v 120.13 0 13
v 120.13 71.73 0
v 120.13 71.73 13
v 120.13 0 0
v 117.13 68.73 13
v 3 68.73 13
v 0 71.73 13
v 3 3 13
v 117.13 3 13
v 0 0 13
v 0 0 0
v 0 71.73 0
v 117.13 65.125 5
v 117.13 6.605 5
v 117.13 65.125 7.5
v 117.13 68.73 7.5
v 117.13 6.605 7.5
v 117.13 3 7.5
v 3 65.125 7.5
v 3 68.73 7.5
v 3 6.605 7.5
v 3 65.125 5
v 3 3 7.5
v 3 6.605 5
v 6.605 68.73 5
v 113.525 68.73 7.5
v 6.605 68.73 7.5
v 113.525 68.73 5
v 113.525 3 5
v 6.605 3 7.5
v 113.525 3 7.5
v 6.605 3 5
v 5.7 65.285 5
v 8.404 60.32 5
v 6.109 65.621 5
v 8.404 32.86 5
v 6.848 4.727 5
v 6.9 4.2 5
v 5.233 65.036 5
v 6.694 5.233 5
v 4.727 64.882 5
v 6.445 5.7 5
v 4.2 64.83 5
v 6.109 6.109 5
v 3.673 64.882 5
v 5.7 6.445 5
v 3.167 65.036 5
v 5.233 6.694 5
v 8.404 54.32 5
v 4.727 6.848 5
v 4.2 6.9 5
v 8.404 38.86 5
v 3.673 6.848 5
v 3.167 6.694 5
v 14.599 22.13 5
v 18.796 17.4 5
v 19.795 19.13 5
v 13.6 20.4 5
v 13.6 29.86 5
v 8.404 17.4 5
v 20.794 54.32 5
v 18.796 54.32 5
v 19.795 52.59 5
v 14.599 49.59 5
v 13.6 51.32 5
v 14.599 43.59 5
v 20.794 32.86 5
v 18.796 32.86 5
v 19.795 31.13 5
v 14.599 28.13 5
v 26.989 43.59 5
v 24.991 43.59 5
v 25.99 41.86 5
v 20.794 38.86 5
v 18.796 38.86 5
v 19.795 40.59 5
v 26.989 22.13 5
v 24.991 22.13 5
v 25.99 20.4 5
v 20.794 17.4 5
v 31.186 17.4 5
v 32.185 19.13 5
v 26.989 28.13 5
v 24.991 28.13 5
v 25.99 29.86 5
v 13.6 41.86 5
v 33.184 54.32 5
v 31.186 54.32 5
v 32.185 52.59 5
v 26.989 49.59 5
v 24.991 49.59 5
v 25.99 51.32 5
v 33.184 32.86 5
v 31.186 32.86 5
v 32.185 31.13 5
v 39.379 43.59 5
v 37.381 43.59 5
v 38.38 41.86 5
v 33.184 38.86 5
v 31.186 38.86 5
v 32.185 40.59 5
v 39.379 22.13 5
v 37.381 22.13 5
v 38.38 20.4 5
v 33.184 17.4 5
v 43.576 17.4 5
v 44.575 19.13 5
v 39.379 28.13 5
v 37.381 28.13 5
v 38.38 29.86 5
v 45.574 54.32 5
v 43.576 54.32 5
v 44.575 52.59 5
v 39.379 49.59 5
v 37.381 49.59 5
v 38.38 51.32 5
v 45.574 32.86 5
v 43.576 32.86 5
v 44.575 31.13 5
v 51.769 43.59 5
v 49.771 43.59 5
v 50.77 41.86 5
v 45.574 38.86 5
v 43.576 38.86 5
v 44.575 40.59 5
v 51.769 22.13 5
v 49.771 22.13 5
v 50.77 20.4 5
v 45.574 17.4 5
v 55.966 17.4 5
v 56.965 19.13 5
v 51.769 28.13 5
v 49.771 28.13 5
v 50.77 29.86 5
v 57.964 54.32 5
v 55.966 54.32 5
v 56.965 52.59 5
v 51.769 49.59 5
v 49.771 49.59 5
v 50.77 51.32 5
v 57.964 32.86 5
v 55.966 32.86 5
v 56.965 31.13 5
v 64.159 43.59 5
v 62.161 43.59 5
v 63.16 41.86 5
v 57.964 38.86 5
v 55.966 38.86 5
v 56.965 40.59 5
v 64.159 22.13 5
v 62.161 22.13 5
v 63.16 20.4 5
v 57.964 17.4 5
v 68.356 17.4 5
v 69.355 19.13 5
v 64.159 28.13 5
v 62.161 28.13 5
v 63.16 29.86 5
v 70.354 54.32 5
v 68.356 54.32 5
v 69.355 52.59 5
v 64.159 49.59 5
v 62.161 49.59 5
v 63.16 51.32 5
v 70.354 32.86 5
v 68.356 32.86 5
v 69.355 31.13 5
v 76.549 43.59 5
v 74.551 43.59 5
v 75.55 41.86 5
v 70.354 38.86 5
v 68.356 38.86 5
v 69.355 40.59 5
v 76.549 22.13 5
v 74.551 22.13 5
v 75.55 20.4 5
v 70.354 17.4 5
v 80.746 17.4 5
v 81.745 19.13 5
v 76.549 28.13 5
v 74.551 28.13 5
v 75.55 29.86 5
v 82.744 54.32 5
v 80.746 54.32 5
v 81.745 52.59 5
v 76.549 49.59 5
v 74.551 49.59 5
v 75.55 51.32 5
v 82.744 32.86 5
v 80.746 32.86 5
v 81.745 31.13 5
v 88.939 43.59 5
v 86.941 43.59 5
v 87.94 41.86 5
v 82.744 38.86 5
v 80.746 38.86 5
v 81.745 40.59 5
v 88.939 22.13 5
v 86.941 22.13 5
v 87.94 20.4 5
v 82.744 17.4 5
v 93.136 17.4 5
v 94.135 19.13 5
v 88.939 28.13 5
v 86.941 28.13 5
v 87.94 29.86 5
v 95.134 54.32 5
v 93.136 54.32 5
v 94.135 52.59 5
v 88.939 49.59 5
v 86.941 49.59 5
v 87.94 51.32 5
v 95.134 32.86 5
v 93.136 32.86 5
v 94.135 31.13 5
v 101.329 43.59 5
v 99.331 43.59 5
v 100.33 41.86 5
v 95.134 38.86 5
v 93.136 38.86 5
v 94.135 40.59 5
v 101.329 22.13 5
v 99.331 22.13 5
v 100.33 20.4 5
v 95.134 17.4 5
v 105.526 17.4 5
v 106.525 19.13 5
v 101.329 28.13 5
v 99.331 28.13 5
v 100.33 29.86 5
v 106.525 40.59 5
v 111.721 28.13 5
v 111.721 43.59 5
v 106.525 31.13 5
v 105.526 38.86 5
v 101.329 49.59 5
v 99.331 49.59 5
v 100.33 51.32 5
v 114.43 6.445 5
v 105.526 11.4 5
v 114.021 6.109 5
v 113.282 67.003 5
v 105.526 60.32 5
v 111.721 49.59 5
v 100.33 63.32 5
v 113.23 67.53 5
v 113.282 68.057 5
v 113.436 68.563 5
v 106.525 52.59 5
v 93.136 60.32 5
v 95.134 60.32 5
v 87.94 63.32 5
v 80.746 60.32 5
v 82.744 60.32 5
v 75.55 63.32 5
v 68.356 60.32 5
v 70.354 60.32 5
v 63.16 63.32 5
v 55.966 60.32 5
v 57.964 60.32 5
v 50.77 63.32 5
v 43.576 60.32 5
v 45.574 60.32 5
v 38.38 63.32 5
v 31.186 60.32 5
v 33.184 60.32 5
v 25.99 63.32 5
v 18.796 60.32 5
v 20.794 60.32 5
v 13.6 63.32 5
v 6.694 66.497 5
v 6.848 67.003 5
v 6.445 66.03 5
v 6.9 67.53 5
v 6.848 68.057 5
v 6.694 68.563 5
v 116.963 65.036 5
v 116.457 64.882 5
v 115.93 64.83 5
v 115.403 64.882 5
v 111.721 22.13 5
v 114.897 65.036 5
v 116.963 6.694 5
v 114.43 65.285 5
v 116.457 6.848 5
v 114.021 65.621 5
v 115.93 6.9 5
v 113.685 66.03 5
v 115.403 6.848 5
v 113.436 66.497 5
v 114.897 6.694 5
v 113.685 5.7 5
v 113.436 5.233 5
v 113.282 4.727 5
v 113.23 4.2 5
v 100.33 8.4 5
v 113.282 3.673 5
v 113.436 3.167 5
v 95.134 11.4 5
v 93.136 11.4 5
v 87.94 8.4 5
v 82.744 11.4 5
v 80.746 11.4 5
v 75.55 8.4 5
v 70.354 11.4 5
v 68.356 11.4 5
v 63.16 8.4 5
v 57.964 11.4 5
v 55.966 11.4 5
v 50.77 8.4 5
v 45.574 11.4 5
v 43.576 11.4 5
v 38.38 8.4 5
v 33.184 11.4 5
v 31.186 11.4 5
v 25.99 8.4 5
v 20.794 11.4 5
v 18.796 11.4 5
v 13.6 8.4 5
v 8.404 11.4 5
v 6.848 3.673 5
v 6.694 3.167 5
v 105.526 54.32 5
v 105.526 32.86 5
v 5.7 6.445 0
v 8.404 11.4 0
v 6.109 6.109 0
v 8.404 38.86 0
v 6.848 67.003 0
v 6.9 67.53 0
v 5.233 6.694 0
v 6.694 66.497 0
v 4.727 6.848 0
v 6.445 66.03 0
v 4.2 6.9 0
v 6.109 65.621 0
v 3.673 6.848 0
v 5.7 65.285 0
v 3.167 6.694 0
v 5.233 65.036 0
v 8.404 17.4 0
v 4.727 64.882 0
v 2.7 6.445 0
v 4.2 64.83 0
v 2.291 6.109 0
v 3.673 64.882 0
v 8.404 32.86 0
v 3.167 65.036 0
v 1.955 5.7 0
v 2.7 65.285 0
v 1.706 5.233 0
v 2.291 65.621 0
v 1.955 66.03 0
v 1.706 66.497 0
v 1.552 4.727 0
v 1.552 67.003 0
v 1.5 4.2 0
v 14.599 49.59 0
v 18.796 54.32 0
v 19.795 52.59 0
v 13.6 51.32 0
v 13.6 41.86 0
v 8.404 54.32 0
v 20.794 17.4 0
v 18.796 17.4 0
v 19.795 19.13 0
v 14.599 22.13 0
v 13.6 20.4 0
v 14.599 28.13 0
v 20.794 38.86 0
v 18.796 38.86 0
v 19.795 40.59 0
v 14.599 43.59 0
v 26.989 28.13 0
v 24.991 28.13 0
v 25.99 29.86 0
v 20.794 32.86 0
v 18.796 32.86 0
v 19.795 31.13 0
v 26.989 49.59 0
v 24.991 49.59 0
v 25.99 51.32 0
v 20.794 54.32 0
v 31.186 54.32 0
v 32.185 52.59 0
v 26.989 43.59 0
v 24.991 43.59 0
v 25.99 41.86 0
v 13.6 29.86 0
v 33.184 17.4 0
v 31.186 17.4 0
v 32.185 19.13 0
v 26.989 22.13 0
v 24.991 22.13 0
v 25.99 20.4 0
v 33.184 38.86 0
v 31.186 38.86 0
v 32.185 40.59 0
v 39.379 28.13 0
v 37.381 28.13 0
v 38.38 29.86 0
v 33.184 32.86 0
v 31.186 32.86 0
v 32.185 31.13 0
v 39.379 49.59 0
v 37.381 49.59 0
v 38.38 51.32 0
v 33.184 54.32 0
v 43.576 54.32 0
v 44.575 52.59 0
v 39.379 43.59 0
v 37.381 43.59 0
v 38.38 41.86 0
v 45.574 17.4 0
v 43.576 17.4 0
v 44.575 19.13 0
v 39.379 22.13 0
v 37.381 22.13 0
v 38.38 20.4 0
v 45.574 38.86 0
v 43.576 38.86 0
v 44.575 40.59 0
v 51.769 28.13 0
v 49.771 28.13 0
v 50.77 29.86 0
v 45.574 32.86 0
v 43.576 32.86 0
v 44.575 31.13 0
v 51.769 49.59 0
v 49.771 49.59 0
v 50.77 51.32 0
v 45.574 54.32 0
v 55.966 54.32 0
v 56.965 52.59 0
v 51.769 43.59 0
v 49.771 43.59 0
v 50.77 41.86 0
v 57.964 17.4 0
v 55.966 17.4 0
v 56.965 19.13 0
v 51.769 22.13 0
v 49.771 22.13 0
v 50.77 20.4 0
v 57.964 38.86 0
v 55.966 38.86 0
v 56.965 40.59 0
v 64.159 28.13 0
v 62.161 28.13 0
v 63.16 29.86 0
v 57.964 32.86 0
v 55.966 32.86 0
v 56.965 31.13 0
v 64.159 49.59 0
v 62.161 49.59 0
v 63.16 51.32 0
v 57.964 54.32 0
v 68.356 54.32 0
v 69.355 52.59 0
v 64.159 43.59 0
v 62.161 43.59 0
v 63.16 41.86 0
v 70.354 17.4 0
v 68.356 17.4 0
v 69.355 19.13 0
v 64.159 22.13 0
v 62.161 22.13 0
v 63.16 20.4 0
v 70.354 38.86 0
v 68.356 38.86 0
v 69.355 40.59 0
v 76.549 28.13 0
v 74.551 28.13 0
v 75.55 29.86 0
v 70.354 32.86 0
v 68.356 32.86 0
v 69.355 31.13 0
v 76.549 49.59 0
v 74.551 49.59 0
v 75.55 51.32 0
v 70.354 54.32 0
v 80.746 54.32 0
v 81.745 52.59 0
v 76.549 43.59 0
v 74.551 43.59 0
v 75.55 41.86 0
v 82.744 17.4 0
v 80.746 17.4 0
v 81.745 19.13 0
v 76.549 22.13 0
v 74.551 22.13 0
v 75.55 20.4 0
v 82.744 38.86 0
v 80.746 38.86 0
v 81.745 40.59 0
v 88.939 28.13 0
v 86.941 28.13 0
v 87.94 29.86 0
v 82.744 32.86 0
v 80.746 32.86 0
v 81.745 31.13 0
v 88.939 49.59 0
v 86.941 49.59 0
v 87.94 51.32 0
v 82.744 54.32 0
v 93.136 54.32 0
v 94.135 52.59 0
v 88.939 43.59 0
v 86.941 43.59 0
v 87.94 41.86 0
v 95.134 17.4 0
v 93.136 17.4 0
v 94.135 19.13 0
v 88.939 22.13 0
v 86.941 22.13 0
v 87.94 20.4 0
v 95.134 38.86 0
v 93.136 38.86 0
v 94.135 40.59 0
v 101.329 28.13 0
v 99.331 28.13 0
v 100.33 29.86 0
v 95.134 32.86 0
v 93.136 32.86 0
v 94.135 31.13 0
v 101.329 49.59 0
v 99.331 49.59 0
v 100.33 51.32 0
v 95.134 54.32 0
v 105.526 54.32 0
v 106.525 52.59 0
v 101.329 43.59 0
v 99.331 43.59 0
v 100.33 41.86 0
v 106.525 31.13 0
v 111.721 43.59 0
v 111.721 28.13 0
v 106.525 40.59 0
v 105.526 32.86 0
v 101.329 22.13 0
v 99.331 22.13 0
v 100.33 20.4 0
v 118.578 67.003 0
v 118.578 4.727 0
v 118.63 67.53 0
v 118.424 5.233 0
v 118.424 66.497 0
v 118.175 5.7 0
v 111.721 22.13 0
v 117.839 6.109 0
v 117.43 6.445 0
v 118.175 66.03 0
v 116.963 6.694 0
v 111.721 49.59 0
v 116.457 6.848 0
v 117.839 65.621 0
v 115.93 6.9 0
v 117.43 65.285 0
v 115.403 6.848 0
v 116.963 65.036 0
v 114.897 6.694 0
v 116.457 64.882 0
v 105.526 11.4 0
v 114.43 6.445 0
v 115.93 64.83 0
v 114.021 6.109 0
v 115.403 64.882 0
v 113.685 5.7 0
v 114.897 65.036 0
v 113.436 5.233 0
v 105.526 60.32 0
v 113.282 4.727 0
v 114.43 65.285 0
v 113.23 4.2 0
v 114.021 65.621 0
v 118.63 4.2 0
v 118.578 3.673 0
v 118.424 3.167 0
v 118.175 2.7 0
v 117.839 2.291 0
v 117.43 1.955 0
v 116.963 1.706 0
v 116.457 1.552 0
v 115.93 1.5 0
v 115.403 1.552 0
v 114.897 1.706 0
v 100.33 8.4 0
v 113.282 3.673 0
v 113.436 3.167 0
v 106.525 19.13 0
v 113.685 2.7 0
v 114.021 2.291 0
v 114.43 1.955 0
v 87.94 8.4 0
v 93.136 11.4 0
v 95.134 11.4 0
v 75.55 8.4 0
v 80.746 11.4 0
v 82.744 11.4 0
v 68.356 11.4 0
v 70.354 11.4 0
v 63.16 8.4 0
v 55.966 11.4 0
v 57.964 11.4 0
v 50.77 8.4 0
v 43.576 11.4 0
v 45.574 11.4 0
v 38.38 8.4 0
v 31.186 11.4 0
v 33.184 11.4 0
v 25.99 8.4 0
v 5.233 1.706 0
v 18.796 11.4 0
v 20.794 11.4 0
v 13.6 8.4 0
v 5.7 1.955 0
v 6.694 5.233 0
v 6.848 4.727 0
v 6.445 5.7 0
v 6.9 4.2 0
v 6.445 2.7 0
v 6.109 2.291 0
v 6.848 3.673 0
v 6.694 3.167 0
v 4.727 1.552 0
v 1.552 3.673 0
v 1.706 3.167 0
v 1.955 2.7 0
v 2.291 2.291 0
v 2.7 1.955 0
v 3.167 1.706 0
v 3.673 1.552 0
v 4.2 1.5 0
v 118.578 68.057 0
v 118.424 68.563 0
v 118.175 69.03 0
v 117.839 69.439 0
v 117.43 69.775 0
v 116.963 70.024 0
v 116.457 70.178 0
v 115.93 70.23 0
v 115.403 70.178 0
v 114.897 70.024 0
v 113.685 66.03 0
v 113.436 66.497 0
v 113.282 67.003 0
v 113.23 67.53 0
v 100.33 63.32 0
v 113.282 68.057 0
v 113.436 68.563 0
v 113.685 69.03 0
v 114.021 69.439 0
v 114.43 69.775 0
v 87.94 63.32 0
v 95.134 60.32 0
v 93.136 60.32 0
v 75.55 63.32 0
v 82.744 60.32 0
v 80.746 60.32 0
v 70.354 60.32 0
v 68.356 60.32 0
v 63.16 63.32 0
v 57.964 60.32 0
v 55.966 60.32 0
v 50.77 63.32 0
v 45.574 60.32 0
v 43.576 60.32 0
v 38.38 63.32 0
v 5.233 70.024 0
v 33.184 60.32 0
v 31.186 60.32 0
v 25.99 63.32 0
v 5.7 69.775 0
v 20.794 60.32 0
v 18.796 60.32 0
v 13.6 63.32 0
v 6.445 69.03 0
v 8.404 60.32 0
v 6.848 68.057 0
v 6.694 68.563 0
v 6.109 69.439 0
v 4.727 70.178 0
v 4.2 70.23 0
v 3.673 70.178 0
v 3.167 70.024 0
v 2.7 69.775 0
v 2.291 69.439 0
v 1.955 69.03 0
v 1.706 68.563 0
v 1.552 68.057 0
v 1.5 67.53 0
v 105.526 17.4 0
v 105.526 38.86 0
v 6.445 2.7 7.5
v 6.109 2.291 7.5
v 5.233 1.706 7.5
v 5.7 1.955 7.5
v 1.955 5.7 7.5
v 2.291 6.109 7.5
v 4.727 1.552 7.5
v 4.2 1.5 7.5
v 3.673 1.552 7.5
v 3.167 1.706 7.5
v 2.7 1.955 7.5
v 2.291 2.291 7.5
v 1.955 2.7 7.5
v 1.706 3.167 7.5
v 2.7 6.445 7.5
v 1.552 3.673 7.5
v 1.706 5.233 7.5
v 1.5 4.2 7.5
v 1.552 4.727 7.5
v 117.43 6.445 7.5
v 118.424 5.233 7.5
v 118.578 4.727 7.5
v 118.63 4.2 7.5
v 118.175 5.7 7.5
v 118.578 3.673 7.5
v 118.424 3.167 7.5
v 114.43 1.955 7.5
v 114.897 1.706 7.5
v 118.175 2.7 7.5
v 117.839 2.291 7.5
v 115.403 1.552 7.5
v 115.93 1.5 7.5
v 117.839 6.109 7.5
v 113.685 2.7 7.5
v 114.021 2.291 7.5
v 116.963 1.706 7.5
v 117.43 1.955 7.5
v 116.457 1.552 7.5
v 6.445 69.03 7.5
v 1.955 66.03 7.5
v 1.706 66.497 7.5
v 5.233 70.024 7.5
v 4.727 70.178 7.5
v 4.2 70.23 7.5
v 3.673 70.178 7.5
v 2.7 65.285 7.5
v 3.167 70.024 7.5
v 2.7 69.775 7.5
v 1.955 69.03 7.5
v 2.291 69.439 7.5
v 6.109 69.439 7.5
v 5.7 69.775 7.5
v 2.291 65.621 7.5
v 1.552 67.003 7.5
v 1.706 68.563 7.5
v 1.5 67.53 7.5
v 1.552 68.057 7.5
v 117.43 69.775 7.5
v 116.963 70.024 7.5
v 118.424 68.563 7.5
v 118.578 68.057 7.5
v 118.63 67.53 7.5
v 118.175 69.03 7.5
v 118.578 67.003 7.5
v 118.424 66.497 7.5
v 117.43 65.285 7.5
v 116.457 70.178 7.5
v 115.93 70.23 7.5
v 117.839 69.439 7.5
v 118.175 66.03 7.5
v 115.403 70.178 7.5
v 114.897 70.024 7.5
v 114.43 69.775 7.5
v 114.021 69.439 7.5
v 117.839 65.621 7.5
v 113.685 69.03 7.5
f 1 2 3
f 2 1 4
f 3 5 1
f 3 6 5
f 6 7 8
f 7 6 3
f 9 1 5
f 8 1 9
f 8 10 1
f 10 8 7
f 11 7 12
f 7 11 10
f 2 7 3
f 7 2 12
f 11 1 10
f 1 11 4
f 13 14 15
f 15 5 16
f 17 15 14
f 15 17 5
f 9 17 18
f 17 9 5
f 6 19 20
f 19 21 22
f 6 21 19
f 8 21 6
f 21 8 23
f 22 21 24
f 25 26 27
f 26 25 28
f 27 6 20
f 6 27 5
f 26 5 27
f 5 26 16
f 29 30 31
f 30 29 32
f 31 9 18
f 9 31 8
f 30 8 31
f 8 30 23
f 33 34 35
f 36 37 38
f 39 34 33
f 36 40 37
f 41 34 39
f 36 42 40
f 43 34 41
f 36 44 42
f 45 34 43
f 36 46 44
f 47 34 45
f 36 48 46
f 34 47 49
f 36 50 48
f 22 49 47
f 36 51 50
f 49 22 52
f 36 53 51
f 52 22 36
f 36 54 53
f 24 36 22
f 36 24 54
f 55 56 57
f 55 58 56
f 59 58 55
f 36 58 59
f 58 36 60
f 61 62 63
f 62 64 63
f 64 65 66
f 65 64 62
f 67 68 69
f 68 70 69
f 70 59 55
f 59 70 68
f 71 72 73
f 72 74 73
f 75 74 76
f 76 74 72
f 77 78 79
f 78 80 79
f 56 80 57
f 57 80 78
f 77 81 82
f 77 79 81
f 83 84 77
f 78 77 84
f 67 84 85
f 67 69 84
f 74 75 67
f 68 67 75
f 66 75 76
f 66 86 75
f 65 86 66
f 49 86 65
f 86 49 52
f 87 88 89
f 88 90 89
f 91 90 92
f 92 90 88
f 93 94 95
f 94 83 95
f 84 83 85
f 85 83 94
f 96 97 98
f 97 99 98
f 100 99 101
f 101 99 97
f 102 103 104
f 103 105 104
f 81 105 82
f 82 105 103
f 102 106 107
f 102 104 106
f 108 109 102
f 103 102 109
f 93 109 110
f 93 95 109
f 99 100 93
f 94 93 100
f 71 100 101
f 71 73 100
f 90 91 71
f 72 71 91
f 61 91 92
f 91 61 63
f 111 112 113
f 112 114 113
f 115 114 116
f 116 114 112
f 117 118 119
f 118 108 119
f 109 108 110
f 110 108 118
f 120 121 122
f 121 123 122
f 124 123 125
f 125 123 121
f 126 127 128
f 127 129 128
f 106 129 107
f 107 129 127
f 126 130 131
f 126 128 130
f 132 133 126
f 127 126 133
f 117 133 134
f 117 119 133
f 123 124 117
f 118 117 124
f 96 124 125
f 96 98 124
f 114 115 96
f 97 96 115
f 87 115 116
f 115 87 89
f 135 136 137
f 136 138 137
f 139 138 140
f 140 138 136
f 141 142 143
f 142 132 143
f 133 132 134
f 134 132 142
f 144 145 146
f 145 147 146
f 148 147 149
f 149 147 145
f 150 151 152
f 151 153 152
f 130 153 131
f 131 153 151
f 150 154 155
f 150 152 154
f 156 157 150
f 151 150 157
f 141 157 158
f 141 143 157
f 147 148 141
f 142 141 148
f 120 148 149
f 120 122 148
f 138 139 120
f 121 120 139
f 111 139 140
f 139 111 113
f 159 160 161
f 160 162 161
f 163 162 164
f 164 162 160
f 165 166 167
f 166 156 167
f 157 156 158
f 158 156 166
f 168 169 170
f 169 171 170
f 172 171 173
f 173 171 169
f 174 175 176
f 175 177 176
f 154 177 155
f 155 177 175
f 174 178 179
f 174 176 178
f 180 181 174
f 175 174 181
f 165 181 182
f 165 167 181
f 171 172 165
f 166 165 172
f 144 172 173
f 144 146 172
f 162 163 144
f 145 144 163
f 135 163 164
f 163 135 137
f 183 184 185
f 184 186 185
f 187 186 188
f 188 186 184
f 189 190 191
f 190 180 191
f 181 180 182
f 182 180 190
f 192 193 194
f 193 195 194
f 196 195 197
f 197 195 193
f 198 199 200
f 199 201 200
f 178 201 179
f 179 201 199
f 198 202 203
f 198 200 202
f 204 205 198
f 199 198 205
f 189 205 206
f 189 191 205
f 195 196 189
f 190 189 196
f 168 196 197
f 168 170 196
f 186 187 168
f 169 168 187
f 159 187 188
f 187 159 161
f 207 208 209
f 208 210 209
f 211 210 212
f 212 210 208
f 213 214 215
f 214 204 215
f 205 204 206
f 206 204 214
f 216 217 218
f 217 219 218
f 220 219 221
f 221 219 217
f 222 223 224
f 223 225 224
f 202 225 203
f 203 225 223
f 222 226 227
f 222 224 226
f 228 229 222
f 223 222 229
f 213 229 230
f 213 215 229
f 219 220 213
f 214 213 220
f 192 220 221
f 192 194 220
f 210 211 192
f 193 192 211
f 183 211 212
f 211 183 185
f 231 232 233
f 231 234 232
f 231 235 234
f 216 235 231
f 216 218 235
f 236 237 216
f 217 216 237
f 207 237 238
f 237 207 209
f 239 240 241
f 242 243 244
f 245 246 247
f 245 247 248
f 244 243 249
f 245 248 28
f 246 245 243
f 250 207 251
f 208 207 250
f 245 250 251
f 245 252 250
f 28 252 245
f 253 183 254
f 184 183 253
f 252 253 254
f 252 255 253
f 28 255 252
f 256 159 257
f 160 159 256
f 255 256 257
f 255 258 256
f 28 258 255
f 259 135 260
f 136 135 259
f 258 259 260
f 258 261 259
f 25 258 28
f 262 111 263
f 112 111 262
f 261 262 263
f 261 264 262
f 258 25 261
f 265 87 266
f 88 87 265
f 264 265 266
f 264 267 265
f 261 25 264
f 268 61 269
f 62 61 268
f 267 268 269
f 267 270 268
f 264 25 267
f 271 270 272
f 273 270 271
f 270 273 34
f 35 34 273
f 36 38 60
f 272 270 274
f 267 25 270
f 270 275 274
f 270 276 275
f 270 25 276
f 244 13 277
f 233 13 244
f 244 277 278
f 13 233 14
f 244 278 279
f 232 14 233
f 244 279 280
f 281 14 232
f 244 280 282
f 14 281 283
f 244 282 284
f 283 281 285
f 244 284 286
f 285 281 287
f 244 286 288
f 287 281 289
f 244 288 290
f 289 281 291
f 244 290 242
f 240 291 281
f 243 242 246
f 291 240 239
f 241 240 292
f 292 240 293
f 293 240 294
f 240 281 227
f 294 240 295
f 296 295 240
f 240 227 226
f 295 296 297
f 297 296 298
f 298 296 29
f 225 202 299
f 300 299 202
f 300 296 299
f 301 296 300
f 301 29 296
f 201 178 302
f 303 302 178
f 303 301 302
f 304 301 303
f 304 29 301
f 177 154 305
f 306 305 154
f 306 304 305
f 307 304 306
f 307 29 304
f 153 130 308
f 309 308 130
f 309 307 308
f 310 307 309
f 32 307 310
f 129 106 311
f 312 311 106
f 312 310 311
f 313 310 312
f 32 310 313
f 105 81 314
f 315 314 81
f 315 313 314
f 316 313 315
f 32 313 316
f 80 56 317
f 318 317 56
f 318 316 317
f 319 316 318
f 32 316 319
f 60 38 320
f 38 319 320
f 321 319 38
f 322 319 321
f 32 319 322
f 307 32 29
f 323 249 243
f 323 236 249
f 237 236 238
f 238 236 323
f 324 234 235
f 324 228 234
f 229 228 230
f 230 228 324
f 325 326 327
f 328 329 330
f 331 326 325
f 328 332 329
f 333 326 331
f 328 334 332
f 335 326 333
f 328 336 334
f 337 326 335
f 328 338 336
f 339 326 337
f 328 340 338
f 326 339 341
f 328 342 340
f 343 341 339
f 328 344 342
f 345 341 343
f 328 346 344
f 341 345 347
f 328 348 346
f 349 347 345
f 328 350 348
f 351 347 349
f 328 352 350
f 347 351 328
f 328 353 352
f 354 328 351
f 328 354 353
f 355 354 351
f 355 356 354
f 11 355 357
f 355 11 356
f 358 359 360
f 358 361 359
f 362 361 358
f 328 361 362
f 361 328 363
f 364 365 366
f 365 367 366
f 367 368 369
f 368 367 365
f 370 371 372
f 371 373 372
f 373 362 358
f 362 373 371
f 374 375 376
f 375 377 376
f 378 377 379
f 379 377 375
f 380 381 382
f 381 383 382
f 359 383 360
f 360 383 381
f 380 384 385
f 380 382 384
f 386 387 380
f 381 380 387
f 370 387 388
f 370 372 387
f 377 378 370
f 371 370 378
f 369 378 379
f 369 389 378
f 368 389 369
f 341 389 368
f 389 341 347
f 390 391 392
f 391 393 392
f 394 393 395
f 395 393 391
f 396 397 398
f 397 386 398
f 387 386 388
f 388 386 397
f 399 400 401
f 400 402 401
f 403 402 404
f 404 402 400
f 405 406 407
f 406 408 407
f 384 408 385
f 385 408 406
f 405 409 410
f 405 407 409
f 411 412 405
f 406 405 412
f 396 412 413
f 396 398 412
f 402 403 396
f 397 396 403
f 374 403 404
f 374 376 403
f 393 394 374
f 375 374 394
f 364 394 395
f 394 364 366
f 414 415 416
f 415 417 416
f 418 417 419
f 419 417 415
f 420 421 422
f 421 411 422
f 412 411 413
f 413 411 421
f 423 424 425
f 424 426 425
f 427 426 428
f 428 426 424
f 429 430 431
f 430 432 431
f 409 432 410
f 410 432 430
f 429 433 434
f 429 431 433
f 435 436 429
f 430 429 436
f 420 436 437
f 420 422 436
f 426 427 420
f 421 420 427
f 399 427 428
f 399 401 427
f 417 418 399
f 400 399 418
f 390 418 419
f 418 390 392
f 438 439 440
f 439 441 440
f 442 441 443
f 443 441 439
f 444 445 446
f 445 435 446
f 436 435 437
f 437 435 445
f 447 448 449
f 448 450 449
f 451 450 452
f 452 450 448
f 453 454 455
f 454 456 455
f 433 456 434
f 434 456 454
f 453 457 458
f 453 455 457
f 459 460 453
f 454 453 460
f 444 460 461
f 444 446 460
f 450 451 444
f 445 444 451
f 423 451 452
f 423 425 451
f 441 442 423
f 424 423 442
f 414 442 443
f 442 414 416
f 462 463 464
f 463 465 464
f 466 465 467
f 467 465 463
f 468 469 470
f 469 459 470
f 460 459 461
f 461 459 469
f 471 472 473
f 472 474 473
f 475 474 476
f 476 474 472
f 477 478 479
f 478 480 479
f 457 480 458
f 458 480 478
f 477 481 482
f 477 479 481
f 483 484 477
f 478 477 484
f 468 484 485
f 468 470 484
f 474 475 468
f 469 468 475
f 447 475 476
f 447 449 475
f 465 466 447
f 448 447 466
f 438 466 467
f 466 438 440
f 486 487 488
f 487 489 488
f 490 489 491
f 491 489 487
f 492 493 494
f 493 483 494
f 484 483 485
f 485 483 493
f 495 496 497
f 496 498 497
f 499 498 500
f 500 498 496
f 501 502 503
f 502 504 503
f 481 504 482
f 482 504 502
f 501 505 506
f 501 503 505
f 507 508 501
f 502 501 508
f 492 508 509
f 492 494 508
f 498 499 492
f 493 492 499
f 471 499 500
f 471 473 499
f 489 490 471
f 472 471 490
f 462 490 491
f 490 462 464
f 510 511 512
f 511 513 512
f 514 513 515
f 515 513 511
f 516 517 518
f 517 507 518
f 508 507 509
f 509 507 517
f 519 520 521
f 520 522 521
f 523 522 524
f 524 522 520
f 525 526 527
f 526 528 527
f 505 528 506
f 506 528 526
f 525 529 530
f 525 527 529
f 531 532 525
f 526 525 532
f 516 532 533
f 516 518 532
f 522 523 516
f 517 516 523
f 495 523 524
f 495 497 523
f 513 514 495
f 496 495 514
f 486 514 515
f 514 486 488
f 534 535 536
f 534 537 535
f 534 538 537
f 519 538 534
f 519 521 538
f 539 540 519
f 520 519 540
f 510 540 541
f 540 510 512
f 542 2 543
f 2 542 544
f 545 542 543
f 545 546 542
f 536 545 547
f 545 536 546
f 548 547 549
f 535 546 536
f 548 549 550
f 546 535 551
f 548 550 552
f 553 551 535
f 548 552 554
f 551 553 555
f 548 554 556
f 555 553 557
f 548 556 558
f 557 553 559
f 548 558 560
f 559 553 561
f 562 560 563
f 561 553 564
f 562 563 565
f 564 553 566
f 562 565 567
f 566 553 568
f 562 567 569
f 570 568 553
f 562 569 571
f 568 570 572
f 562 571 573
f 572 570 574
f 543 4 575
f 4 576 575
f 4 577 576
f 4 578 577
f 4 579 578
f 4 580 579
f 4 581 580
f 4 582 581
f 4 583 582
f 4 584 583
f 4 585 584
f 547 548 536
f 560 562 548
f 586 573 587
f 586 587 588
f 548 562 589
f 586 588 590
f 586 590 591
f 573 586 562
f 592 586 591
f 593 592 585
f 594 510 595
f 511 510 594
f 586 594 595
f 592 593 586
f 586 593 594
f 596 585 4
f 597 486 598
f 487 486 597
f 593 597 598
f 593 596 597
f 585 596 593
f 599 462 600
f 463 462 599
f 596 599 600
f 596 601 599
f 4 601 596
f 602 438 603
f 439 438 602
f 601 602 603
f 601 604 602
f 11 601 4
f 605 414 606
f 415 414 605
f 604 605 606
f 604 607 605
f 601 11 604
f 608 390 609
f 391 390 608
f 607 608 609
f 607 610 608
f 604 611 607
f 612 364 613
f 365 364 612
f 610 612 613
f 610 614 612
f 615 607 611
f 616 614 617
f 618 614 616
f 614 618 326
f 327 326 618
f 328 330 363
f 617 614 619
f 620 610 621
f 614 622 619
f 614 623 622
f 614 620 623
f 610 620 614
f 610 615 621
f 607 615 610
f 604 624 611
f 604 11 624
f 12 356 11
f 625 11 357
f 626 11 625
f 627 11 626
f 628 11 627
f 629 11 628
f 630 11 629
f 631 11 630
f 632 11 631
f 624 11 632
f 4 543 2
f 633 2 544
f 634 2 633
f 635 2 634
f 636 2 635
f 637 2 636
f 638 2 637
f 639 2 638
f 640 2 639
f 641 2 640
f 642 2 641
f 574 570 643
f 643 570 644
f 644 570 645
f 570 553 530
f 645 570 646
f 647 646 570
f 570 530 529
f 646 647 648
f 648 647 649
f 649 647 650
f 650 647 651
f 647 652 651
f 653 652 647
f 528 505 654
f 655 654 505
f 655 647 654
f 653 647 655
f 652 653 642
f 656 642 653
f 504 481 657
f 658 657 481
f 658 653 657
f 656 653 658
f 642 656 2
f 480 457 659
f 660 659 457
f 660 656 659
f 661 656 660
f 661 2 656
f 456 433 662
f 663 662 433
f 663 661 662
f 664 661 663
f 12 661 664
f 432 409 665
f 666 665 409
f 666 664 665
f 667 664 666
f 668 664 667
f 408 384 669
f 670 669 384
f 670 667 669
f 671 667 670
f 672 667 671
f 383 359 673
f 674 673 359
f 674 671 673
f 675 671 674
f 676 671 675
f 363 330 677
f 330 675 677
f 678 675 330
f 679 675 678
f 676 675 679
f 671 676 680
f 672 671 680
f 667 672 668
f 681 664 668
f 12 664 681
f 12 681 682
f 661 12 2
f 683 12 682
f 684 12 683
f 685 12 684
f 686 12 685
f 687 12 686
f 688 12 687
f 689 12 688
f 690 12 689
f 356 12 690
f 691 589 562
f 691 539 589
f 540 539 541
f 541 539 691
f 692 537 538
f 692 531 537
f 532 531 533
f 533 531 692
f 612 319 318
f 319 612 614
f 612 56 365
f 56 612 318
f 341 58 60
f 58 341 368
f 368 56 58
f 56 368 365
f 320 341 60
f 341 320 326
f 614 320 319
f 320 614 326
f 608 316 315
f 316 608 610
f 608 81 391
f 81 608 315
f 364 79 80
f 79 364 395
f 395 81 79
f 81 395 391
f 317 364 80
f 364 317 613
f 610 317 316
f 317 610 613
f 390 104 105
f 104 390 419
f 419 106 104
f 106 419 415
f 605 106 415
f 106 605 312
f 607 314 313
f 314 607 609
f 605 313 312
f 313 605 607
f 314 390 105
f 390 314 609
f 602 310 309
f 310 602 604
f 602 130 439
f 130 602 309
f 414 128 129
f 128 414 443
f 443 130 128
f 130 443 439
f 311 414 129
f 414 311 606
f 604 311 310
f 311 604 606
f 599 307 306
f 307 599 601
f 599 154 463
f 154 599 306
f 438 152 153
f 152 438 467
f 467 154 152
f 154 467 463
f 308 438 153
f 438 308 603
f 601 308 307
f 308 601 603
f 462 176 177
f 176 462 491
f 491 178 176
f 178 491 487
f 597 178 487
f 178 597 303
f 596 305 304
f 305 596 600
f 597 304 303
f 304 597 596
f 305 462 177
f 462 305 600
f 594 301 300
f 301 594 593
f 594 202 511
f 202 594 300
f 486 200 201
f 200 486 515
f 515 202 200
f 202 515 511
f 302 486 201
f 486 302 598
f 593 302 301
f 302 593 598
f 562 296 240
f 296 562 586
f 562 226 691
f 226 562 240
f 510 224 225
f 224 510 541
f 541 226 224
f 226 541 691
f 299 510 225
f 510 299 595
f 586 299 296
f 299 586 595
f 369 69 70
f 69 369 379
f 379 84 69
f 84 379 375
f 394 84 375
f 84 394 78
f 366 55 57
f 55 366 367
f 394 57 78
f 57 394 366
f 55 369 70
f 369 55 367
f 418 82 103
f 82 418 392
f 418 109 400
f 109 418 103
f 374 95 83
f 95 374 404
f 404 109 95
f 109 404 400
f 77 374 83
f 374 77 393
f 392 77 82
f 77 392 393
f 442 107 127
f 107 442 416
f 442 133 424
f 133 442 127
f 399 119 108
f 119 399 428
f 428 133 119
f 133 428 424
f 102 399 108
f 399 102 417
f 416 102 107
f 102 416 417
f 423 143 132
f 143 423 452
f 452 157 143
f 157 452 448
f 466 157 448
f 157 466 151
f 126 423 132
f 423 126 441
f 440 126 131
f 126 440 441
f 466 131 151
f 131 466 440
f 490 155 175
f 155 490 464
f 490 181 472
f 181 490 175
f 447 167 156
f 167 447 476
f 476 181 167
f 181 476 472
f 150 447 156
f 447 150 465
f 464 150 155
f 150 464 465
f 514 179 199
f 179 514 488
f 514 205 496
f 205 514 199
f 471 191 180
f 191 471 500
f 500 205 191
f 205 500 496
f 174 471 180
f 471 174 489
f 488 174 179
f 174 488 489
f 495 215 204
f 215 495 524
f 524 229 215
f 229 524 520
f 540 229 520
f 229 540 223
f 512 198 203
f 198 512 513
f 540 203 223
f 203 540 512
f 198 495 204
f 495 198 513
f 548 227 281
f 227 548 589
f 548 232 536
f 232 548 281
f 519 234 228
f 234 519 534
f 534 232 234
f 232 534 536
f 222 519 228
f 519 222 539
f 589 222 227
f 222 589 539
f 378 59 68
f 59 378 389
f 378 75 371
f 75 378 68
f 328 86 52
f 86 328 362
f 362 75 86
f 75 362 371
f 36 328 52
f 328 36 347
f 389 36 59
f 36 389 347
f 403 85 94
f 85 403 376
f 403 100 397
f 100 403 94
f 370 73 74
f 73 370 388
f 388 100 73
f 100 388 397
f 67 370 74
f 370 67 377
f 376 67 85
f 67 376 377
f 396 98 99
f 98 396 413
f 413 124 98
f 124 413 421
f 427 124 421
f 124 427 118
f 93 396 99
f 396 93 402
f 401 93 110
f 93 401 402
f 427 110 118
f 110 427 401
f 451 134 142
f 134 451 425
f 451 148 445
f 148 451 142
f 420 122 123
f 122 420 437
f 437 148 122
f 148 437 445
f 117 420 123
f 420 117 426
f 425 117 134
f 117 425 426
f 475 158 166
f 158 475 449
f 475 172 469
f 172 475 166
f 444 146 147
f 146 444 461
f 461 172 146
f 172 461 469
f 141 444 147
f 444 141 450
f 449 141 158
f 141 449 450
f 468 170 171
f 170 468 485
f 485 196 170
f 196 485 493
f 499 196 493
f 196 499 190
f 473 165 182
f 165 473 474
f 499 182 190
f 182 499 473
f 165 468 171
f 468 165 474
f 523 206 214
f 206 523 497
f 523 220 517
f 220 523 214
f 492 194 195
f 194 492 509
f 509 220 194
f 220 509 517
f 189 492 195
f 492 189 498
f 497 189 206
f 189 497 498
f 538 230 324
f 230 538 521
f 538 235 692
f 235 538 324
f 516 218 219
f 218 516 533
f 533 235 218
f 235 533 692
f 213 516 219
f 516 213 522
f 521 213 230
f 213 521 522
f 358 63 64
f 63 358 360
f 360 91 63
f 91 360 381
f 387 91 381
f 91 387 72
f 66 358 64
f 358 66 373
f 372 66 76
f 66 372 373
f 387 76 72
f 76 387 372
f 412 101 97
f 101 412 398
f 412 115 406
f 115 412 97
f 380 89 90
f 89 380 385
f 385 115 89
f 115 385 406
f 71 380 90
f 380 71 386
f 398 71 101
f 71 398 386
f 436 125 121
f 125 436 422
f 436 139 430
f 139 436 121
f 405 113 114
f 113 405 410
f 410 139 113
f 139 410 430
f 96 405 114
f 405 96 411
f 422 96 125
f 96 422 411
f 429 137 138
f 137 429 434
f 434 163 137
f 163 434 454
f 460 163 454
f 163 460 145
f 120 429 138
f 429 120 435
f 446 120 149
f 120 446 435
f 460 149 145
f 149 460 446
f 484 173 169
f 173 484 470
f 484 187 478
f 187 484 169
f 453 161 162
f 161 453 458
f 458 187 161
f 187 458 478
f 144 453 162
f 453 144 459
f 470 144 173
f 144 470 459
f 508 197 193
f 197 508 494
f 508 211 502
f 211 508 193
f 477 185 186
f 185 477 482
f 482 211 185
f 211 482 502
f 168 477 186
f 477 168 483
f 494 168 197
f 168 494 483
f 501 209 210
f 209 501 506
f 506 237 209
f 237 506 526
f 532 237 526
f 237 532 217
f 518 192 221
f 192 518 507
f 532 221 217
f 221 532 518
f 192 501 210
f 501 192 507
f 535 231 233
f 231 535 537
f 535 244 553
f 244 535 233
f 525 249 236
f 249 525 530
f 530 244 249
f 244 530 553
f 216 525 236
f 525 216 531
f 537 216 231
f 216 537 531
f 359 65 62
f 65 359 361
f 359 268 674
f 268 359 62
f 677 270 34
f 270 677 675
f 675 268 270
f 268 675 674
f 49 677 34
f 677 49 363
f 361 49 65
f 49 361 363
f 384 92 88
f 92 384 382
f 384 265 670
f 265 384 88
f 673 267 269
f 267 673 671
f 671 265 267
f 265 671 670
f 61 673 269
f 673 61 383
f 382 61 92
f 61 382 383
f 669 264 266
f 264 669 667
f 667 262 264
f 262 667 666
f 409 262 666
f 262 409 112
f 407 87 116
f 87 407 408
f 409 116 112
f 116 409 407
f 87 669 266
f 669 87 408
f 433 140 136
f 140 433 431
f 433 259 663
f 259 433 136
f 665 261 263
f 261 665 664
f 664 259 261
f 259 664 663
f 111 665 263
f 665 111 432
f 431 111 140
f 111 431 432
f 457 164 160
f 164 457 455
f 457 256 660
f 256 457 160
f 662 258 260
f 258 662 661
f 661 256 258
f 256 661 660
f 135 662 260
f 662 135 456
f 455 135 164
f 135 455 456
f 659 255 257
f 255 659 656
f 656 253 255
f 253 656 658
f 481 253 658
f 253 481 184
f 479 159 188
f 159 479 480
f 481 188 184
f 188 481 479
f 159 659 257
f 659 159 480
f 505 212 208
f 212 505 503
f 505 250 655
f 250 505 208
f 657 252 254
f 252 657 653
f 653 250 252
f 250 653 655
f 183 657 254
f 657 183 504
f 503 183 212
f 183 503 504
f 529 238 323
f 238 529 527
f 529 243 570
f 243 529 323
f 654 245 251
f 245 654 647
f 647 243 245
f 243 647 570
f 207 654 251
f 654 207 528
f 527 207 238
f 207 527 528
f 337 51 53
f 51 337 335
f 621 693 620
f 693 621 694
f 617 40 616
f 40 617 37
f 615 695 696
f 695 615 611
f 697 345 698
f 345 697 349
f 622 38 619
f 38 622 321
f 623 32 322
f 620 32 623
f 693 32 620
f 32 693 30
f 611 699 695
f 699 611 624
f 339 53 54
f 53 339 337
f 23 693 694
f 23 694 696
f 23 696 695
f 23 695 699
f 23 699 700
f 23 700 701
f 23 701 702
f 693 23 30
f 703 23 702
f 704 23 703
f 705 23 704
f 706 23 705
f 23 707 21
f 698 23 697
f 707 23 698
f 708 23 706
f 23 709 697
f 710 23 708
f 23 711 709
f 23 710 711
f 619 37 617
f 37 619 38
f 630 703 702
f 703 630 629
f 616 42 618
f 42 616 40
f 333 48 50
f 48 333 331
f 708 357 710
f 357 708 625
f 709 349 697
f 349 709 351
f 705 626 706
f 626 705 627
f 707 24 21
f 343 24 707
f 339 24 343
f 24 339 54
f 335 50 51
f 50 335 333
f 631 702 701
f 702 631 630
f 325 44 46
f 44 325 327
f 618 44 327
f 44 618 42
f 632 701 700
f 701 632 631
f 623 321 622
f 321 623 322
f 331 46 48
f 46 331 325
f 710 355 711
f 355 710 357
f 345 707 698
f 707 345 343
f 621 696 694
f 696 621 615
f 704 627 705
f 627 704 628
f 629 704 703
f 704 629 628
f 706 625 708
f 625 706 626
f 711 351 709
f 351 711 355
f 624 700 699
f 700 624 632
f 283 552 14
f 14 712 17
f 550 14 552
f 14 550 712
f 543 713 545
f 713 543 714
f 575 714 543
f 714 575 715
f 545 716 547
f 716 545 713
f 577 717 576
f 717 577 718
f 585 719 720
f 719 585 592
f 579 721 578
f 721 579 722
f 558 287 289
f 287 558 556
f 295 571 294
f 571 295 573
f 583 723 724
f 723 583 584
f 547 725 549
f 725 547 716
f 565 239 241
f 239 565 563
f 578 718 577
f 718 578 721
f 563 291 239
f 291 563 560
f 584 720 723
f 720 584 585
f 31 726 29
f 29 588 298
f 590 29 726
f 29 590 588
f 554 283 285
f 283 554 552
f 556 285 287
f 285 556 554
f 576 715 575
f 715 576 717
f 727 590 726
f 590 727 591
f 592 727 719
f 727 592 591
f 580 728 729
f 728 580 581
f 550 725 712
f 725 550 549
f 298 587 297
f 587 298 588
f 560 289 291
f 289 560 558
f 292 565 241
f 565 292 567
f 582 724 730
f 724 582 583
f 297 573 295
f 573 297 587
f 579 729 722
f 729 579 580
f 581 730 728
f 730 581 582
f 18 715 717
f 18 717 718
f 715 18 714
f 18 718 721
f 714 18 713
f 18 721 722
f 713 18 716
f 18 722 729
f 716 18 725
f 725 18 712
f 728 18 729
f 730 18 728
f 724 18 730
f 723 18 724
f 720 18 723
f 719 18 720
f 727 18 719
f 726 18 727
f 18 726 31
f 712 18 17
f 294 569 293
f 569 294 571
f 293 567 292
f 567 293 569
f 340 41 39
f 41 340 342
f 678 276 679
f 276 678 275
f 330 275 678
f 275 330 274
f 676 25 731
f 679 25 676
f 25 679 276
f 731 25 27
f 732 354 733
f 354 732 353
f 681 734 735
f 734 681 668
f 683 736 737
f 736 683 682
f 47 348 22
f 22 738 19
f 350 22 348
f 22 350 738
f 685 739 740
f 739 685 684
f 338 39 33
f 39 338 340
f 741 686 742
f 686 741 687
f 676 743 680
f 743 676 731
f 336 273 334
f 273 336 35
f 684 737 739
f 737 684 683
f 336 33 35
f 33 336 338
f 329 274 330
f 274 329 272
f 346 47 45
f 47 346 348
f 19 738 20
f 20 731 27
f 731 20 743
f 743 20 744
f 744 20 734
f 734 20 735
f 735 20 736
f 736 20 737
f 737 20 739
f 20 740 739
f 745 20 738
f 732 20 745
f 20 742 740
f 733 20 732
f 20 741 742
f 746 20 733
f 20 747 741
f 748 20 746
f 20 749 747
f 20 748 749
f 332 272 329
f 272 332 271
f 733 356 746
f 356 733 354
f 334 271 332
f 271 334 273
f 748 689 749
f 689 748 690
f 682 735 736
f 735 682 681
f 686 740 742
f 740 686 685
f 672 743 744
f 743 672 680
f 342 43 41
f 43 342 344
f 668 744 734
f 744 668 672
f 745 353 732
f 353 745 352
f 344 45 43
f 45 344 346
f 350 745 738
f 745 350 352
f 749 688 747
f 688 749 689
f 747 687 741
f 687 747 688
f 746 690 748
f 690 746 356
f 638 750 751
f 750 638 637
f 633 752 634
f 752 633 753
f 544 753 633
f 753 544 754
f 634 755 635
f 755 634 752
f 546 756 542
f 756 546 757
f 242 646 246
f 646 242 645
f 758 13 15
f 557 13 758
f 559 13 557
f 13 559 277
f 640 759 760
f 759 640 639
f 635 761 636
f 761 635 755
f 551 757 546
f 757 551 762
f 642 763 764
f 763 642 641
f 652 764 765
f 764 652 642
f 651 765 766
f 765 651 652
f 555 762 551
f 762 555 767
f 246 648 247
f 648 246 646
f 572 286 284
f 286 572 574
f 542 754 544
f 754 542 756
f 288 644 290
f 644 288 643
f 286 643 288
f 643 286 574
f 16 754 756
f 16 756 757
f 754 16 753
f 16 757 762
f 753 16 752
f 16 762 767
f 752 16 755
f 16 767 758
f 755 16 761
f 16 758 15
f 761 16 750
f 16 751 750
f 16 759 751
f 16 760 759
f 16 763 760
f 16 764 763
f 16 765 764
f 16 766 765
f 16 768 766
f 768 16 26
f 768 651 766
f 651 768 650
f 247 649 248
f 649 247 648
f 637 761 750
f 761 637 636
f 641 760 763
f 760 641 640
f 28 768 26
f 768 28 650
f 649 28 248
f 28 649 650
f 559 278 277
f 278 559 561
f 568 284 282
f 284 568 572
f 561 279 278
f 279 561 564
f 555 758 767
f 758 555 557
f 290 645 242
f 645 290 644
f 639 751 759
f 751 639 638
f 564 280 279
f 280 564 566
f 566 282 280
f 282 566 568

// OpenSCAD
$fn = 32;

// ----------------------------------------------------------------------
// Honeycomb panel: 120.13 x 71.73 mm, 40 cells of 12 mm
// ----------------------------------------------------------------------

// --- parameters (mm) ---
panel_w = 120.13;         // panel width
panel_d = 71.73;          // panel depth
thick = 5;                // panel thickness
cell_r = 6;               // hex cell circumradius
pitch = 12.39;            // hex cell pitch (centre to centre)
web = 2;                  // web between the cells
columns = 8;              // columns of cells
rows = 5;                 // rows of cells
cell_count = 40;          // total cells
shift_x = 13.6;           // first cell offset in x
shift_y = 14.4;           // first cell offset in y
mount_d = 5.4;            // corner mounting holes
hole_off = 4.2;           // mounting hole offset from the corners
rim_h = 13;               // rim height
rim_t = 3;                // rim wall thickness

difference() {
  union() {
    cube([panel_w, panel_d, thick]);
    /* rim around the panel, sunk 1 mm into the plate */
    translate([0, 0, thick - 1]) difference() {
      cube([panel_w, panel_d, rim_h - thick + 1]);
      translate([rim_t, rim_t, -2.5]) cube([panel_w - 2 * rim_t, panel_d - 2 * rim_t, rim_h - thick + 6]);
    }
  }
  /* hexagonal cells, point-up, cut right through the plate */
  for (row = [0 : rows - 1]) {
    for (col = [0 : columns - 1]) {
      translate([shift_x + col * pitch + (row % 2) * pitch / 2, shift_y + row * pitch * 0.866025, -2.5]) rotate([0, 0, 30]) cylinder(h = thick + 5, d = 2 * cell_r, $fn = 6);
    }
  }
  /* corner mounting holes, clear of the outer cell web */
  translate([4.2, 4.2, -2.5]) cylinder(h = thick + 5, d = mount_d);
  translate([115.93, 4.2, -2.5]) cylinder(h = thick + 5, d = mount_d);
  translate([4.2, 67.53, -2.5]) cylinder(h = thick + 5, d = mount_d);
  translate([115.93, 67.53, -2.5]) cylinder(h = thick + 5, d = mount_d);
}
